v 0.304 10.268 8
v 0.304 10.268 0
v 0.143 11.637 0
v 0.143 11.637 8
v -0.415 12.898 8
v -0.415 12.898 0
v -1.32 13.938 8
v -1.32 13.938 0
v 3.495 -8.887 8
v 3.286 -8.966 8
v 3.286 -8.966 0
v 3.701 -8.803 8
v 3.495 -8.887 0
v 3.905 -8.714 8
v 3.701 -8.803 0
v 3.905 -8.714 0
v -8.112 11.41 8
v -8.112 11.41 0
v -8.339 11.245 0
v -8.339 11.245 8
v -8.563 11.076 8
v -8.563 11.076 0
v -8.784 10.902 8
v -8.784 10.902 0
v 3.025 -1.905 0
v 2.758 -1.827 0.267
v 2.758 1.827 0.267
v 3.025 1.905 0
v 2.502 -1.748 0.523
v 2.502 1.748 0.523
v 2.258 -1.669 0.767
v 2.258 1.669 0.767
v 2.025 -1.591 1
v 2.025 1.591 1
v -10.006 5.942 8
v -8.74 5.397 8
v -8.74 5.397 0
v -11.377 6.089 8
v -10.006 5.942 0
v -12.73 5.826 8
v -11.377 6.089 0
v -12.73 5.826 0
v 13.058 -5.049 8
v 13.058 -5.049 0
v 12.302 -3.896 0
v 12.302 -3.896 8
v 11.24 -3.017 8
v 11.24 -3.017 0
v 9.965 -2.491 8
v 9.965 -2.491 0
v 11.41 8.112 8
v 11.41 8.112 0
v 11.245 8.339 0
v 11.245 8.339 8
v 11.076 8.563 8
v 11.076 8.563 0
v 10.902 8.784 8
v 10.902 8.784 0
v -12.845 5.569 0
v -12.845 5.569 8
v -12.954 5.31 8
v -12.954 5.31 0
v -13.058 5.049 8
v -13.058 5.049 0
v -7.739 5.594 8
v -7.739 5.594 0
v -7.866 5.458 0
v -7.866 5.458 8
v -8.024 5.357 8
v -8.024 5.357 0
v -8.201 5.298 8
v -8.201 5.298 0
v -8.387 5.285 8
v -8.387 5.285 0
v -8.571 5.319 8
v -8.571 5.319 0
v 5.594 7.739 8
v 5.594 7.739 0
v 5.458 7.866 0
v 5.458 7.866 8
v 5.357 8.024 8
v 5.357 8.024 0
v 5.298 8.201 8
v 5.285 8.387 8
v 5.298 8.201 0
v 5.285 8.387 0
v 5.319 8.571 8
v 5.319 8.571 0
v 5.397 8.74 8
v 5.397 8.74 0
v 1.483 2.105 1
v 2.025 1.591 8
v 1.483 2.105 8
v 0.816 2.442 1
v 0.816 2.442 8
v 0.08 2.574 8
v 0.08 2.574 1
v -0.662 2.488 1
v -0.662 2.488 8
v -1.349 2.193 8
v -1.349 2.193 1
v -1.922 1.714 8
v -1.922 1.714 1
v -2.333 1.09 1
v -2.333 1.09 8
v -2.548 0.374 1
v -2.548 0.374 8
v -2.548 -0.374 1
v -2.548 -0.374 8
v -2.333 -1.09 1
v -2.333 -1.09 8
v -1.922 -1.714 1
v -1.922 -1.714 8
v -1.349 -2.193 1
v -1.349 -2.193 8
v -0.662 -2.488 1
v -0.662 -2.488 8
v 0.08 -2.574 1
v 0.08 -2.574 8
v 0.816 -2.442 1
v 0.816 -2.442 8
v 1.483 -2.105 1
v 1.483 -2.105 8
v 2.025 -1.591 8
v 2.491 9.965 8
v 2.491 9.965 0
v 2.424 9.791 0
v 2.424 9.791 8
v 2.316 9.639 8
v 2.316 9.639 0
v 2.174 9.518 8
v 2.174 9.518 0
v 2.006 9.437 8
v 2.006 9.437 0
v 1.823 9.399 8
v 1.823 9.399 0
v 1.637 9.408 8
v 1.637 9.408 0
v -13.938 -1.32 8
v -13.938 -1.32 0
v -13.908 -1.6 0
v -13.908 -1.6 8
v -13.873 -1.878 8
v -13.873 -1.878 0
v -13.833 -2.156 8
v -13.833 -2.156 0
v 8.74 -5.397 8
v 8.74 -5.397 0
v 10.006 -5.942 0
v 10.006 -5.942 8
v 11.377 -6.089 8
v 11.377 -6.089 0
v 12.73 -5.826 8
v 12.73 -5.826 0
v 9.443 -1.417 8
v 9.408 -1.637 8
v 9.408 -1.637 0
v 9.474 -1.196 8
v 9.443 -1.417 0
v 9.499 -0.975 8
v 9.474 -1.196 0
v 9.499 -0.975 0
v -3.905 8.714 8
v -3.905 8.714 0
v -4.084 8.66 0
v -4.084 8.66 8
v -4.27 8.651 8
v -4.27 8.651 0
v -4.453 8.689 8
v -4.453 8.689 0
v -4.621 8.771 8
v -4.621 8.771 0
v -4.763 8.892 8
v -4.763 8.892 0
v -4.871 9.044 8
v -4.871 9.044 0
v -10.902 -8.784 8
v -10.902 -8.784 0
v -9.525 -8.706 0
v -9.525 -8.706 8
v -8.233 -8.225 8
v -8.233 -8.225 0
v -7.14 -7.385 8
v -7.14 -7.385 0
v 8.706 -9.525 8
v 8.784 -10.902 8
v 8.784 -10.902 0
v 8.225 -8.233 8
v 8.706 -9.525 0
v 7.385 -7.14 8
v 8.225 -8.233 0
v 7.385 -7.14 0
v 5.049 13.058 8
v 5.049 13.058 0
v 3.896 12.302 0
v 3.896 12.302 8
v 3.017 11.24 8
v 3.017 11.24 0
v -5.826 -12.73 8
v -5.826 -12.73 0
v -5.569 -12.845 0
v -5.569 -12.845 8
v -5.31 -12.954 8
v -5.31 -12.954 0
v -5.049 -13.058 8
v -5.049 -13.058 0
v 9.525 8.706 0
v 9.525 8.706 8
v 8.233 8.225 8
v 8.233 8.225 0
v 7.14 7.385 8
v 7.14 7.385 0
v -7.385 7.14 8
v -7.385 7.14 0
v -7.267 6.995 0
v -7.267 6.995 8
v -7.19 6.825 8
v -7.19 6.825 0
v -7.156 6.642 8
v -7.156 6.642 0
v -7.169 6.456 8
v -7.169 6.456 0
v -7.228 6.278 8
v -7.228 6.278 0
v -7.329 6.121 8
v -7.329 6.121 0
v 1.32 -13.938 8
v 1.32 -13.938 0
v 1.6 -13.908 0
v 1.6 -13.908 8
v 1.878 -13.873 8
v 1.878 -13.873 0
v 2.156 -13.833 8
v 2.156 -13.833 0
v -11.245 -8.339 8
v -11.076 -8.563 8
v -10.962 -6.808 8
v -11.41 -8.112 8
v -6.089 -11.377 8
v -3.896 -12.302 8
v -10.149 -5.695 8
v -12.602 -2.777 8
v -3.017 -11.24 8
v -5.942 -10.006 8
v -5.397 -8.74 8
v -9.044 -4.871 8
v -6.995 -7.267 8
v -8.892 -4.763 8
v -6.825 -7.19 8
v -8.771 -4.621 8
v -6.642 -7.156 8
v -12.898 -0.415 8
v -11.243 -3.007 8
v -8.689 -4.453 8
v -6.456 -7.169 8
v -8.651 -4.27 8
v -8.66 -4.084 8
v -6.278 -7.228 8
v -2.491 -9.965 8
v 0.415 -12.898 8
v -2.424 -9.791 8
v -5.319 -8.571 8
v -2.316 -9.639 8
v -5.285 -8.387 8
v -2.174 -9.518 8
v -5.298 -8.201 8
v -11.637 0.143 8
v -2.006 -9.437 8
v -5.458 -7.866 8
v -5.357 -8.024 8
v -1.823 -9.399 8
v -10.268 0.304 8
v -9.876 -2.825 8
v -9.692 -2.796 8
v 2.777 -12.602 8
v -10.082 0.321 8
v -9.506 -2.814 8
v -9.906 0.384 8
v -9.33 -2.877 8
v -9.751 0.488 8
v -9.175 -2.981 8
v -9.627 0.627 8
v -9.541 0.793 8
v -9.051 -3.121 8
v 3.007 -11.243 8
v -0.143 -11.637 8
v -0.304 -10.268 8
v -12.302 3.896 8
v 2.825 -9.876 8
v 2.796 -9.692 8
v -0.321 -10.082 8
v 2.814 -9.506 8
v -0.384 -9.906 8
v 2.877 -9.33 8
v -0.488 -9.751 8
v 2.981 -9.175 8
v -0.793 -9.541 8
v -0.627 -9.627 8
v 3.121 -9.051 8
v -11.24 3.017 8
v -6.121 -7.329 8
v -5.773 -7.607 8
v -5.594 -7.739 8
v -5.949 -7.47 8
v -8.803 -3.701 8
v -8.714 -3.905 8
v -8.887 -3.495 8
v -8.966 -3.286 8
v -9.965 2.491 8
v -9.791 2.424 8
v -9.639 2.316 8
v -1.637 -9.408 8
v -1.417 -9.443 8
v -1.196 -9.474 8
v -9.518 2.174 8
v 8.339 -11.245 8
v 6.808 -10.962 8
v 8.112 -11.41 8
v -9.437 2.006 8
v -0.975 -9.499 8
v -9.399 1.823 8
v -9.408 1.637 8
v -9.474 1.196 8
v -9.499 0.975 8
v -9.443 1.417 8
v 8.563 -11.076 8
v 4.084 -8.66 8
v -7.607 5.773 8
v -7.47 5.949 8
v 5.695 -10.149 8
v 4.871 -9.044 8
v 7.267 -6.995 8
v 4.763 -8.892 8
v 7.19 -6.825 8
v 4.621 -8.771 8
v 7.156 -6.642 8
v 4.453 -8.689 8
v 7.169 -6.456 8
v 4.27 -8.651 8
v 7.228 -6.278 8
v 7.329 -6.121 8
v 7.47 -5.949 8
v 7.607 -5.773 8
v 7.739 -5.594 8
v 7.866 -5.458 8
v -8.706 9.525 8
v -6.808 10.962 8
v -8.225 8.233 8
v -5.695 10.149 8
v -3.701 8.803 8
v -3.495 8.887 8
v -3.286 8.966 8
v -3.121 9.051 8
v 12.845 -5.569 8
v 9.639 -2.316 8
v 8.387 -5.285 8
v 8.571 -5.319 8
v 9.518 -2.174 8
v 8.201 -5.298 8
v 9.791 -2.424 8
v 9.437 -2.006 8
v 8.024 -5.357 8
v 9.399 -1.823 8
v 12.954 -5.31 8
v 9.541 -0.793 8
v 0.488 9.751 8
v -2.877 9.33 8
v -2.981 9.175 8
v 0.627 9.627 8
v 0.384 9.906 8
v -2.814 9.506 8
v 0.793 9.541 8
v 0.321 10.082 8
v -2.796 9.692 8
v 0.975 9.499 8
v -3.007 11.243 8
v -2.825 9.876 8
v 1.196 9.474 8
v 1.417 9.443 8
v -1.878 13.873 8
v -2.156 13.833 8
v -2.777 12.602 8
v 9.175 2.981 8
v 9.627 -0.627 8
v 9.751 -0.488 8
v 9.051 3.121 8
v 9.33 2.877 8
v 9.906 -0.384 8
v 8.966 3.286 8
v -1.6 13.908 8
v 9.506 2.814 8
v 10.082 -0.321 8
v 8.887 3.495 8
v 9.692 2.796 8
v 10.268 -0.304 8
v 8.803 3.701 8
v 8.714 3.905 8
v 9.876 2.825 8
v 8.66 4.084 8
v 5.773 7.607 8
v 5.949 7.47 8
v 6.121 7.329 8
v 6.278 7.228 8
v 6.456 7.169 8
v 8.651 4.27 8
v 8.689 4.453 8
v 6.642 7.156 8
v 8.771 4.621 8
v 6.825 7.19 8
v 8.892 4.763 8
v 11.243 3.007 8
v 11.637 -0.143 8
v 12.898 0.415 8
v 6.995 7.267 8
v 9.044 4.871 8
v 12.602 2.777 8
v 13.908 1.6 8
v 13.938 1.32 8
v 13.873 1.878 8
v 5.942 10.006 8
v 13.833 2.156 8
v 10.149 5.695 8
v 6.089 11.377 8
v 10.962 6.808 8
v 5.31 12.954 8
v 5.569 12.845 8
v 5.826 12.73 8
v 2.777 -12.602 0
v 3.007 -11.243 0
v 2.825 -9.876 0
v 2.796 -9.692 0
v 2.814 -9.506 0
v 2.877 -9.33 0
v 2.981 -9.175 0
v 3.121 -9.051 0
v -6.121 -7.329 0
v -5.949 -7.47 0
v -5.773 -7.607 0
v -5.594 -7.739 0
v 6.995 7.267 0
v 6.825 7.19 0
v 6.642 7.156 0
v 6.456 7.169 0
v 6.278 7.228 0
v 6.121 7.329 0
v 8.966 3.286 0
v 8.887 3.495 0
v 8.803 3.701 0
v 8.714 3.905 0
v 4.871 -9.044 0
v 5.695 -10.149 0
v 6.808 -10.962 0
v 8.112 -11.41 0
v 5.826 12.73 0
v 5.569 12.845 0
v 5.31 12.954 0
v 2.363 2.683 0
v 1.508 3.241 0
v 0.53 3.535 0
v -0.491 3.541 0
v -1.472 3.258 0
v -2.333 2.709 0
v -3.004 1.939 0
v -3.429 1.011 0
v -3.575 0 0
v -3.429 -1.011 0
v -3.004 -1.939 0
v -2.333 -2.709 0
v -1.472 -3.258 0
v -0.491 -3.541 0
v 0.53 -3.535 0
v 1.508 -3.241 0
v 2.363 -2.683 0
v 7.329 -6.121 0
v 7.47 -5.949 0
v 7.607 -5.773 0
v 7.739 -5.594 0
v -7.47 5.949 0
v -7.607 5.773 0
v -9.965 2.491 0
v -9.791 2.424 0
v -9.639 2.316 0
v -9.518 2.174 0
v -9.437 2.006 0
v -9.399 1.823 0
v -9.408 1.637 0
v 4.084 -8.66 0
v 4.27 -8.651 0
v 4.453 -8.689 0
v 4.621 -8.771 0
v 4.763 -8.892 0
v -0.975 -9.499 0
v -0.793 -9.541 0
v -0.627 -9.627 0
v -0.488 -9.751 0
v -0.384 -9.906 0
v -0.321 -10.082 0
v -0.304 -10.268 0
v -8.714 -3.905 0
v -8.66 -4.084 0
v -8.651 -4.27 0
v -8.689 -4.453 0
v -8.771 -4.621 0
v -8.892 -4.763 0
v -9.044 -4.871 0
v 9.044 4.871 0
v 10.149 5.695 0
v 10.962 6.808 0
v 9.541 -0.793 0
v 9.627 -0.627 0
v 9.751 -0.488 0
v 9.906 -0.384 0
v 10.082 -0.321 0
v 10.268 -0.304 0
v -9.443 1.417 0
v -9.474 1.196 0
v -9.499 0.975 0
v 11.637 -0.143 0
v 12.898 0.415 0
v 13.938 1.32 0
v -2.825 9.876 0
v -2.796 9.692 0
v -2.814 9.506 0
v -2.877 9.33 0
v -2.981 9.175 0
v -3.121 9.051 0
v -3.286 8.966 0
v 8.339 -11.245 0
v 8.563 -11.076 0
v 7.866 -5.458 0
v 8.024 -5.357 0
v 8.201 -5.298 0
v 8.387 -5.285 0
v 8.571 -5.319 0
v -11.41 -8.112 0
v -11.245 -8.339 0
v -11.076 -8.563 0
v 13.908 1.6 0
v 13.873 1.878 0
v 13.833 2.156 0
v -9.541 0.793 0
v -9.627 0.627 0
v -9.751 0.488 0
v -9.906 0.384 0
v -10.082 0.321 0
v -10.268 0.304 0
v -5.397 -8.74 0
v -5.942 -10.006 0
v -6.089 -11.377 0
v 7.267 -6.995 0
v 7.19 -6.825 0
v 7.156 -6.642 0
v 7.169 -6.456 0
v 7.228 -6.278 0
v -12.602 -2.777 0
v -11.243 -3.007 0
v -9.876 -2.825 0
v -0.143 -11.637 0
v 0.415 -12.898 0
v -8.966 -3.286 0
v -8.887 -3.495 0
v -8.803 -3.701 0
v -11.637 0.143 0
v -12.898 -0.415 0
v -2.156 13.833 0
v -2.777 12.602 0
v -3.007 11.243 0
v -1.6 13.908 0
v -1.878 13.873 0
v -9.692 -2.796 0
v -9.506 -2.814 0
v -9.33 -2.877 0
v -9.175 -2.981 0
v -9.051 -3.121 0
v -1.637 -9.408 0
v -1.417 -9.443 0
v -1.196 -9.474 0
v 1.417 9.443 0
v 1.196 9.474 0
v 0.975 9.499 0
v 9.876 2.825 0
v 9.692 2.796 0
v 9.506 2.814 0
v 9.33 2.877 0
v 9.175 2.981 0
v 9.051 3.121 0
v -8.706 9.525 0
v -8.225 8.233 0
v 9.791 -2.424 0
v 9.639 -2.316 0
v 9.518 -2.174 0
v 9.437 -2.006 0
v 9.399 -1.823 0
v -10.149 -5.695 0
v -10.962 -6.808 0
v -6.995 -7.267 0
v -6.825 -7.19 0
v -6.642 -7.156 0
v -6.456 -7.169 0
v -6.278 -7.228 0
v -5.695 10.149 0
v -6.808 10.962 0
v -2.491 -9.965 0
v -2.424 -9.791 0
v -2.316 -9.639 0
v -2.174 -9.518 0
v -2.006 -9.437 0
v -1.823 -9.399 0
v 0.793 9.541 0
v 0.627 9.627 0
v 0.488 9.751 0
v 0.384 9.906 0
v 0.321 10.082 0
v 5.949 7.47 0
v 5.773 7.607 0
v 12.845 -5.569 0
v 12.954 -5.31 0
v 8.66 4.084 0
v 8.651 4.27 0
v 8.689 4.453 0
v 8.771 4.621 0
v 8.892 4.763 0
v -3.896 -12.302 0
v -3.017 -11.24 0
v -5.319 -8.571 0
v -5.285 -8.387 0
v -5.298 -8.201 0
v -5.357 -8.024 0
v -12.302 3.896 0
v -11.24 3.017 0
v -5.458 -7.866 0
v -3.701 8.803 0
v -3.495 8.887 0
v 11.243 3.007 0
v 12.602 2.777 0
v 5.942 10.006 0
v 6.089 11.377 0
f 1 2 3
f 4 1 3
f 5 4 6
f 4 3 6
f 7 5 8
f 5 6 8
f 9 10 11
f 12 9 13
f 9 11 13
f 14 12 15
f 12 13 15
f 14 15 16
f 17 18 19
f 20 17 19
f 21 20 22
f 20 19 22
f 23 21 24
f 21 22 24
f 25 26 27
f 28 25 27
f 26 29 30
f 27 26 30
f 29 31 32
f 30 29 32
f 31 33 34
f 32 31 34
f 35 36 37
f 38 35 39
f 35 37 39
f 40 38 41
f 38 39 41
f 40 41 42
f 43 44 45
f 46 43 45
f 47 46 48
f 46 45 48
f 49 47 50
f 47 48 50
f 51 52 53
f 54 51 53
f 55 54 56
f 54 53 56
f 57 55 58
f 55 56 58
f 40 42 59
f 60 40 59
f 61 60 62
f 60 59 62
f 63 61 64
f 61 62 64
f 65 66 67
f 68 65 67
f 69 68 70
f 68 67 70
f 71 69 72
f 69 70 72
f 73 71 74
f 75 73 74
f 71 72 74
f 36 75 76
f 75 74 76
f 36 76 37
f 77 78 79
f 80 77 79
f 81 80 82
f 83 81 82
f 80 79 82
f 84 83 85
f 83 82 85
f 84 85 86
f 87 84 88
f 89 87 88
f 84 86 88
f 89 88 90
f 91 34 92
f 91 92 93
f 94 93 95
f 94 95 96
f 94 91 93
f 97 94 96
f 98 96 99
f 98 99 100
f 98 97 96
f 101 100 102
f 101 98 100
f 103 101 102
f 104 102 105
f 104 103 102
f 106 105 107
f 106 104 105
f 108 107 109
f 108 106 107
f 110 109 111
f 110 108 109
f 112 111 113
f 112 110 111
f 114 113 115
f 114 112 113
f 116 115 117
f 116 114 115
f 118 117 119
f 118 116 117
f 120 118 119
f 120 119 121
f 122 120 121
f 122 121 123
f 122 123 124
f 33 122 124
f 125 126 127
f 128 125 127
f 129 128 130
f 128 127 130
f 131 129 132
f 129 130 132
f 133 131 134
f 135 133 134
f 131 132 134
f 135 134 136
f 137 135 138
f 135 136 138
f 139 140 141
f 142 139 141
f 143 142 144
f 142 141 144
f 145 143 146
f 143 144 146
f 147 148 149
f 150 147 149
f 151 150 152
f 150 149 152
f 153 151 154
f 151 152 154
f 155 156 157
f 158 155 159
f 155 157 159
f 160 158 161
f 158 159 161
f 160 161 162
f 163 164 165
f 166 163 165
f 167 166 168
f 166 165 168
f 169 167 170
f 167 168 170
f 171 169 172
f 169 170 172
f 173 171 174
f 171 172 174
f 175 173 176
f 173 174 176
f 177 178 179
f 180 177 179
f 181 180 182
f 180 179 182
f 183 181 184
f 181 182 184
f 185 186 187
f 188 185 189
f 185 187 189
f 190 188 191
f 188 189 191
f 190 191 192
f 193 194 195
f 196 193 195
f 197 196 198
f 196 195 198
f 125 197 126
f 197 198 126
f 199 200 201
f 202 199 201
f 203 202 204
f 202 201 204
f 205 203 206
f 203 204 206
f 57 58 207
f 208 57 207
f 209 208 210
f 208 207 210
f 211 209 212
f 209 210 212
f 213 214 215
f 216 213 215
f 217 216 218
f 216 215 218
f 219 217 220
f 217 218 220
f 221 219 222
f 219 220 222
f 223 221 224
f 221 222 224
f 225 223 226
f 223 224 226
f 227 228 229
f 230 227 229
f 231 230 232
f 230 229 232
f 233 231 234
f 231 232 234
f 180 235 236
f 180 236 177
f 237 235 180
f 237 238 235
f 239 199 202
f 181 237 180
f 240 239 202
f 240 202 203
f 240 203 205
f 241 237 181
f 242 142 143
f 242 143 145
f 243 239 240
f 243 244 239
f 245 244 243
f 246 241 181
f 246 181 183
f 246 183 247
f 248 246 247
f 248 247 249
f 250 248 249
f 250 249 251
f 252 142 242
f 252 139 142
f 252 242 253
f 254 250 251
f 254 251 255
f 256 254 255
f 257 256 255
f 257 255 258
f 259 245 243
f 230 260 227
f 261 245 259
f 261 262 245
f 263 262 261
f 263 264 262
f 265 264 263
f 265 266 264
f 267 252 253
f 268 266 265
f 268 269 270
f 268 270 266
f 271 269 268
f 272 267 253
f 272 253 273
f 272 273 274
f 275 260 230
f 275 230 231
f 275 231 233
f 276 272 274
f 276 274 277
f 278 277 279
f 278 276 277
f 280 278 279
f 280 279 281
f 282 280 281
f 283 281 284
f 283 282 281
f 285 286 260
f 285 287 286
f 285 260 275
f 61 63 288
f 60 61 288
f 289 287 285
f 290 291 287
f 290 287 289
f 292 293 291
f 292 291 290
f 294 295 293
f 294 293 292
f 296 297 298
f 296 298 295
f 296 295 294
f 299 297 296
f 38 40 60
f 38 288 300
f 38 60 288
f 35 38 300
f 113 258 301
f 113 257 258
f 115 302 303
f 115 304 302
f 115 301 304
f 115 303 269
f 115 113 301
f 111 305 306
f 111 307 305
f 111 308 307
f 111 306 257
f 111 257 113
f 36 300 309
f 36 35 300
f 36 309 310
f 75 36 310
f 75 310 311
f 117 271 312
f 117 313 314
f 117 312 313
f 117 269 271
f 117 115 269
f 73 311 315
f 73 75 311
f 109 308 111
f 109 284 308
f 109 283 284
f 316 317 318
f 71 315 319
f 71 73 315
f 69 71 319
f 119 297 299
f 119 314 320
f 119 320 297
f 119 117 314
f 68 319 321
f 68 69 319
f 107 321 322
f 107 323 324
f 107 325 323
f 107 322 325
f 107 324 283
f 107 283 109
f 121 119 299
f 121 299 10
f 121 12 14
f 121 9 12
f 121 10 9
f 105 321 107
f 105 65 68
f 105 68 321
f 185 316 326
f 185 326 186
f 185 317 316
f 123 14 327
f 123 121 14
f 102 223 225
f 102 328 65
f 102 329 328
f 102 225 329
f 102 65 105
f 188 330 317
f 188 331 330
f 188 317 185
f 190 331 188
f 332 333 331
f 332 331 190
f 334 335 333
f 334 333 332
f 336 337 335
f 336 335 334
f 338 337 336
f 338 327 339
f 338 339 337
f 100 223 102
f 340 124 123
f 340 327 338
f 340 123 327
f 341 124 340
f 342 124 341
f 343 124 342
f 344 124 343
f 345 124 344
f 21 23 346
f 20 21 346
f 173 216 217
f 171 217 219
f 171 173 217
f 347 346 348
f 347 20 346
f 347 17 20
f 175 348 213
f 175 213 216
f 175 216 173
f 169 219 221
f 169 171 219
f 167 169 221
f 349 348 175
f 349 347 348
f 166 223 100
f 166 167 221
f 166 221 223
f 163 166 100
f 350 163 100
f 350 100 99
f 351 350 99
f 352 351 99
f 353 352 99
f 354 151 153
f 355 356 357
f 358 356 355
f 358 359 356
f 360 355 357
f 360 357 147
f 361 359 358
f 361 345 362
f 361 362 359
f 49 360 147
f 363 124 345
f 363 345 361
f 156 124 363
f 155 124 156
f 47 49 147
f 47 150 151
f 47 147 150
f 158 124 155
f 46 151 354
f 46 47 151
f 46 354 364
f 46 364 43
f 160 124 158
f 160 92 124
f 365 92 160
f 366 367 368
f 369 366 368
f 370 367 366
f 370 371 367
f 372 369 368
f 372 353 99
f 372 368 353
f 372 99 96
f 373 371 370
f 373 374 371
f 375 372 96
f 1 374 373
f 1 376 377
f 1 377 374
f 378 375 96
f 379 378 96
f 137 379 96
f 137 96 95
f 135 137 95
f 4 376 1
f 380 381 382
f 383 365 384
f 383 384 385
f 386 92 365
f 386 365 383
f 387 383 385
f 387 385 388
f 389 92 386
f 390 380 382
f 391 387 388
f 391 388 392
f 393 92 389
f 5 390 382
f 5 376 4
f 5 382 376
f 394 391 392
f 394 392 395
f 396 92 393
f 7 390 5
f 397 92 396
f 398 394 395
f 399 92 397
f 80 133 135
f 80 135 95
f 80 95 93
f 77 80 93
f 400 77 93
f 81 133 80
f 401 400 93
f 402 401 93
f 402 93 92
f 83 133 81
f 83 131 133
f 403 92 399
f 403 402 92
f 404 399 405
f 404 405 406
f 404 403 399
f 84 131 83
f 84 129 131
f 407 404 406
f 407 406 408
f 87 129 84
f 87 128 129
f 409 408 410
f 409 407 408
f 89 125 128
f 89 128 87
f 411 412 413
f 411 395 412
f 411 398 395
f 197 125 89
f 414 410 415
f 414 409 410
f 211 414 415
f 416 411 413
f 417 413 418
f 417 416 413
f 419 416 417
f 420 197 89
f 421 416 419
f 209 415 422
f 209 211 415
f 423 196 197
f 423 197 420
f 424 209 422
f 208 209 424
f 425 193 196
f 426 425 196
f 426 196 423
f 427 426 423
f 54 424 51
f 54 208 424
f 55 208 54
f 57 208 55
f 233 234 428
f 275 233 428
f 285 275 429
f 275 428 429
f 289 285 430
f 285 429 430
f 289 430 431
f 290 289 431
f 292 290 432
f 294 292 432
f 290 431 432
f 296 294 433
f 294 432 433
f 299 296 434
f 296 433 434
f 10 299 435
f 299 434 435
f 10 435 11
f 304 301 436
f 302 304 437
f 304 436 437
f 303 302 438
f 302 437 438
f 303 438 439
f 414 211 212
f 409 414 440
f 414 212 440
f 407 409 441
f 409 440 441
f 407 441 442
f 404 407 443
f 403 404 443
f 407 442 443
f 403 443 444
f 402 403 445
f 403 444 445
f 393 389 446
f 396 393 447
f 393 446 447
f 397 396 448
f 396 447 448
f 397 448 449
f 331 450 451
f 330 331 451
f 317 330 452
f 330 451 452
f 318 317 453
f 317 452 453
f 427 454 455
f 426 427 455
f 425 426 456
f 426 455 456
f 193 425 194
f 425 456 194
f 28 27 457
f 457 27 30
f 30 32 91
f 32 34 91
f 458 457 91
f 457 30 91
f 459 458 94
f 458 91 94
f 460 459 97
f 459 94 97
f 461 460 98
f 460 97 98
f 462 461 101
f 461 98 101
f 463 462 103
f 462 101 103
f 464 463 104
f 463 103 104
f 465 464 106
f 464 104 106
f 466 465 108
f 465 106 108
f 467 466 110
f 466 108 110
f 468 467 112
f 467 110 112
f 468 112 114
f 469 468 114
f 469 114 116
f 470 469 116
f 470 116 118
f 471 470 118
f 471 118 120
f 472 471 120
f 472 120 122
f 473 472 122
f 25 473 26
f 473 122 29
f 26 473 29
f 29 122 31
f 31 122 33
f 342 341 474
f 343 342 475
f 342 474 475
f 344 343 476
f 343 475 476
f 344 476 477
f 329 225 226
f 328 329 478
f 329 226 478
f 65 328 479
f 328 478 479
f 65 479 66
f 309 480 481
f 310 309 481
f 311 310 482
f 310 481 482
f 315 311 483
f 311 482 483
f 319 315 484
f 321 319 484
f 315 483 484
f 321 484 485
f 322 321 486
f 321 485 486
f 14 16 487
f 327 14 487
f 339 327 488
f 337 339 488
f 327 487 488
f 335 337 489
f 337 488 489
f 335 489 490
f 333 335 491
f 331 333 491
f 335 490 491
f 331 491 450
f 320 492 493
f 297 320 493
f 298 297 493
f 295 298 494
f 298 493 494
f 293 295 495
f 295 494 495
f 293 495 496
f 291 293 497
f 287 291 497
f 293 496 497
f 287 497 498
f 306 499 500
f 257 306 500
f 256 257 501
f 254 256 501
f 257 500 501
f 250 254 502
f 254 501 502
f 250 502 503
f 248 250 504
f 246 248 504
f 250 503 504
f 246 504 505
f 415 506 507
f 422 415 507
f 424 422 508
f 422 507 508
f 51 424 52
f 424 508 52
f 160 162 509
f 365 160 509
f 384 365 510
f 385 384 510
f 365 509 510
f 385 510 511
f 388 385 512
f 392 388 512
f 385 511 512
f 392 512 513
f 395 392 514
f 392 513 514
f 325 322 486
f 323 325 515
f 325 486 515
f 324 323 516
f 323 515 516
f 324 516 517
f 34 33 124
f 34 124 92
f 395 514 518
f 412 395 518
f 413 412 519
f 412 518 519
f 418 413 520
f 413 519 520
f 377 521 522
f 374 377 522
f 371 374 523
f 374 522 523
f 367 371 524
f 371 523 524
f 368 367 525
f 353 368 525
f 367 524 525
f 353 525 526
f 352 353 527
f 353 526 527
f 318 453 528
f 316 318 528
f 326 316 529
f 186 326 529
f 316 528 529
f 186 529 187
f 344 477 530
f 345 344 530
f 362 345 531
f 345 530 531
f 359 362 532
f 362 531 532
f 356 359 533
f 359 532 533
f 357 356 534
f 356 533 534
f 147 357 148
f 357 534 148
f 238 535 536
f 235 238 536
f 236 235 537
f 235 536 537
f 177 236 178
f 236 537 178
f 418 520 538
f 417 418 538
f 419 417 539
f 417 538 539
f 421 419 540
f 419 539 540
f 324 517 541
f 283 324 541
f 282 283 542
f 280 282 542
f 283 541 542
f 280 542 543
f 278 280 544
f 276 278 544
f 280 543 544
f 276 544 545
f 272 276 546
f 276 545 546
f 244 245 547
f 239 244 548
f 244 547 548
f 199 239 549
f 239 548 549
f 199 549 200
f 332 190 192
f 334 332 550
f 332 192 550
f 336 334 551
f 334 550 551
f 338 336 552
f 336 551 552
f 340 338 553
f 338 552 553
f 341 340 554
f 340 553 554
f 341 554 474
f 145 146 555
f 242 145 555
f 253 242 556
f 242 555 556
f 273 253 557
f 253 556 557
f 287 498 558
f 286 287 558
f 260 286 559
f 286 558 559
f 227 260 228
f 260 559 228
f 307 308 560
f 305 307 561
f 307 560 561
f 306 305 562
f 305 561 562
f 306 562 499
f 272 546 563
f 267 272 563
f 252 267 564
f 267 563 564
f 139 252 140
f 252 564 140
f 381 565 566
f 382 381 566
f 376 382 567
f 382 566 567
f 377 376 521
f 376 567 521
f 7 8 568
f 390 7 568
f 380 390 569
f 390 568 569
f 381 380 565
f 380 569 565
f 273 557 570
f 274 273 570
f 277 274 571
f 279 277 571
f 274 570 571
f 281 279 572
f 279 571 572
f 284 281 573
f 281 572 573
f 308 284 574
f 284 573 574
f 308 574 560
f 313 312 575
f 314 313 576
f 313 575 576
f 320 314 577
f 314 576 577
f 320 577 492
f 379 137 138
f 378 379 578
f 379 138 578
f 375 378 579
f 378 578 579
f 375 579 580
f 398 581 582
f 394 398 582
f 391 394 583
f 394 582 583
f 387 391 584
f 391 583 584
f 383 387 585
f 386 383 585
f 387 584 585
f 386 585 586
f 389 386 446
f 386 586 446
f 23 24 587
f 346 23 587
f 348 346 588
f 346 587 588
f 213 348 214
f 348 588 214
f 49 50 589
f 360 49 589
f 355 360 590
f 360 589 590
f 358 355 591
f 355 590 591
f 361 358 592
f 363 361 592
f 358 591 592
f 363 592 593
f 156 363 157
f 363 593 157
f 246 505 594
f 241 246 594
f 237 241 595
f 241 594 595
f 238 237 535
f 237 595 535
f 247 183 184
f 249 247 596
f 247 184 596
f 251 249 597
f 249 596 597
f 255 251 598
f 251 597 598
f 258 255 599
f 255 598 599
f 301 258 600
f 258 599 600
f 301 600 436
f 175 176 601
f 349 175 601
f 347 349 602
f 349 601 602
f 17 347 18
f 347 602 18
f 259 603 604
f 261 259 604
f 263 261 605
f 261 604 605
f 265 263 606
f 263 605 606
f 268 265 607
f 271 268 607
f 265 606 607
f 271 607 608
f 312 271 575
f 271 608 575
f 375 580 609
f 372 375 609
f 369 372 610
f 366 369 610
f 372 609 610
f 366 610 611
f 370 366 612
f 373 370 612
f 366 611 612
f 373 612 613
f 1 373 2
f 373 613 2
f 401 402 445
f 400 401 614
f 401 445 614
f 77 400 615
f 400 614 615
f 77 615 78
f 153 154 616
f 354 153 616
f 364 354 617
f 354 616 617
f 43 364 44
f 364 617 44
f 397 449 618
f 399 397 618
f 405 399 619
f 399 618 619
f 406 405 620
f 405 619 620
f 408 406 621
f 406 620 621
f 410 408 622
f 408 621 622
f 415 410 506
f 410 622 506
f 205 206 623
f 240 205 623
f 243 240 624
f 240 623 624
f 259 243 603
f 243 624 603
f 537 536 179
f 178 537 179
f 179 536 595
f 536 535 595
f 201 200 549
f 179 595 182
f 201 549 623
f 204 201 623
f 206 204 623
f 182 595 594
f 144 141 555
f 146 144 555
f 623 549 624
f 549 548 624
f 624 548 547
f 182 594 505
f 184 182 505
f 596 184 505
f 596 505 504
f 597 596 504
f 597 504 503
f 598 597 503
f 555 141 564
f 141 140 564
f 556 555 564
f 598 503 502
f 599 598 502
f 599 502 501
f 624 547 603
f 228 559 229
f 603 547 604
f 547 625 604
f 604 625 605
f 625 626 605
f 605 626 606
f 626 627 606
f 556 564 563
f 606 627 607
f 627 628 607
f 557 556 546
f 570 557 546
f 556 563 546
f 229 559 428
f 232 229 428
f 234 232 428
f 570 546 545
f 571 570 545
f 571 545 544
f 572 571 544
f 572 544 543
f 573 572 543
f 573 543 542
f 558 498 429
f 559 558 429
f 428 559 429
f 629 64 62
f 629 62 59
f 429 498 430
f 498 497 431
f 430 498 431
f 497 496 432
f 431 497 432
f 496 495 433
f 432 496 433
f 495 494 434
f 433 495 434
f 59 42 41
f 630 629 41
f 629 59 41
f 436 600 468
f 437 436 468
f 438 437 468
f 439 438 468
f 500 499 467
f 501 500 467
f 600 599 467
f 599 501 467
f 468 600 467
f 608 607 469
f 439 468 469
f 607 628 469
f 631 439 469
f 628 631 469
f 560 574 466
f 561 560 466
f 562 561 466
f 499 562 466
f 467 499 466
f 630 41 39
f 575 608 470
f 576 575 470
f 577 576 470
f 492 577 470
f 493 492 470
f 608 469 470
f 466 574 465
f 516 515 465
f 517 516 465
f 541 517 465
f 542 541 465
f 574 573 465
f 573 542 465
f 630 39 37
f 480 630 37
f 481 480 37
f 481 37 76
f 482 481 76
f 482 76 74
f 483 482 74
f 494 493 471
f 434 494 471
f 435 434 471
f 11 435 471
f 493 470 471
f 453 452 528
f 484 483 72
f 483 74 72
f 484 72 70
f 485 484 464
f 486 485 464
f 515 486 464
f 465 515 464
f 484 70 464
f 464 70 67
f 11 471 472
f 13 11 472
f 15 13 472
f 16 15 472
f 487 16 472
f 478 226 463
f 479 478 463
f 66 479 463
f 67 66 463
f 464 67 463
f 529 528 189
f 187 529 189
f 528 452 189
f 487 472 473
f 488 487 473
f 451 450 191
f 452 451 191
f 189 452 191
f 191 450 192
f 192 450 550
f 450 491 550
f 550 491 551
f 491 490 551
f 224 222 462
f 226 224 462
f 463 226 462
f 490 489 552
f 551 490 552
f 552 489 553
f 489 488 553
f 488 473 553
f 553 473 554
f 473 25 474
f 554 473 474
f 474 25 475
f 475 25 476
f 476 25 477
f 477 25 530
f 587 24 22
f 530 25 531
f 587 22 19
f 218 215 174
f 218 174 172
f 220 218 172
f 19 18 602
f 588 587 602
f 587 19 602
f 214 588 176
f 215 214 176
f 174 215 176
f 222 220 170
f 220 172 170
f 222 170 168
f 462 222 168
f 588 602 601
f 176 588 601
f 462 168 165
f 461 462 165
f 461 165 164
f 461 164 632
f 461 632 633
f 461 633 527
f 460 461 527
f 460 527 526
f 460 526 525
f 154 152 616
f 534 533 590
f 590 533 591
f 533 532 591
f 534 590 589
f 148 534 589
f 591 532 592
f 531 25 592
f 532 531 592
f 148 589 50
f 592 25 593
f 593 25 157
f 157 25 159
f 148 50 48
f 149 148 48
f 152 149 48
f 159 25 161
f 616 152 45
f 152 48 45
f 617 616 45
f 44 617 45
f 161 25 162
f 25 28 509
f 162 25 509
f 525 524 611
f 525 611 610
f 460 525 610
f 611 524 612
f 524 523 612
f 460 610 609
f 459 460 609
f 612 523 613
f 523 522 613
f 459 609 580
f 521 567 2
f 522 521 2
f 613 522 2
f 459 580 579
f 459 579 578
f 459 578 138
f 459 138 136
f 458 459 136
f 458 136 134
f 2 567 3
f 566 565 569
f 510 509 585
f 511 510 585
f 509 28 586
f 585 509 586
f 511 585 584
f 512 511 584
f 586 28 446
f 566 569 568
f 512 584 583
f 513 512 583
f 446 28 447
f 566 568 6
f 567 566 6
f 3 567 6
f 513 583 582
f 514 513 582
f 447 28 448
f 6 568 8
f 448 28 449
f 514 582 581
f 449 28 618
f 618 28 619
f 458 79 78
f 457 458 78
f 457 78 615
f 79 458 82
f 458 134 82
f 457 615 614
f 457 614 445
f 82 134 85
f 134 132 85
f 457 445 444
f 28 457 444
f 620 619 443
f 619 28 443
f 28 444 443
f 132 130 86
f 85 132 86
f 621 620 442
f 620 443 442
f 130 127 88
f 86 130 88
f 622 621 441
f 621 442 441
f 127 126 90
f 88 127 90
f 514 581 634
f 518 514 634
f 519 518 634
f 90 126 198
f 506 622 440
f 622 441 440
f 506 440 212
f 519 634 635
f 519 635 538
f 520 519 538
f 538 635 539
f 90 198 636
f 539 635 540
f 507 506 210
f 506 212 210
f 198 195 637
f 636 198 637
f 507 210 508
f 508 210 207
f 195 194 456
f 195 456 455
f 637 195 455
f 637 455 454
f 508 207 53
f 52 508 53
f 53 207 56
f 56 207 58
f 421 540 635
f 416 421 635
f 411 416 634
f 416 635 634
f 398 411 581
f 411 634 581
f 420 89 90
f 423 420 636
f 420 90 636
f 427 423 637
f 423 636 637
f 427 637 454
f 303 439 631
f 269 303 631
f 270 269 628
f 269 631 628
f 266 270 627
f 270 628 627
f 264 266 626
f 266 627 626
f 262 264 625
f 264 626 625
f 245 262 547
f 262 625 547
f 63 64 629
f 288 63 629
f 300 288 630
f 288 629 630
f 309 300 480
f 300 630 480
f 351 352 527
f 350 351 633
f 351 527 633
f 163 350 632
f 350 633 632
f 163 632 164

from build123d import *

# Parameters (mm, degrees)
SKETCH3_R          = 14
GEARBODY_DEPTH     = 8
TOOTHCUT_DEPTH     = 22.354156504
CIRPATTERN1_COUNT  = 12
CUT_EXTRUDE1_DEPTH = 8
CHAMFER1_SIZE      = 1


with BuildPart() as part:
    # Sketch3 → gearBody (new body)
    with BuildSketch(Plane.XY):
        Circle(SKETCH3_R)
    extrude(amount=GEARBODY_DEPTH)

    # Sketch2 → toothCut (cut, through all)
    with BuildSketch(Plane.XY):
        with BuildLine():
            ThreePointArc((9.407882888, -1.636752947), (9.459378184, -1.306669437), (9.499295851, -0.974986654))
            ThreePointArc((9.499295851, -0.974986654), (9.751264317, -0.488083012), (10.267616219, -0.303844098))
            ThreePointArc((10.267616219, -0.303844098), (12.510323629, 0.19449452), (14.235972761, 1.711139825))
            ThreePointArc((14.235972761, 1.711139825), (14.203571583, -1.962007706), (13.238980983, -5.506387425))
            ThreePointArc((13.238980983, -5.506387425), (11.989111429, -3.578719403), (9.965486694, -2.491051791))
            ThreePointArc((9.965486694, -2.491051791), (9.51841766, -2.173730906), (9.407882888, -1.636752947))
        make_face()
    toothcut = extrude(amount=TOOTHCUT_DEPTH, mode=Mode.SUBTRACT)

    # CirPattern1: toothCut ×12 about axis
    cirpattern1_axis = Axis((0, 0, 0), (0, 0, 1))
    for i in range(1, CIRPATTERN1_COUNT):
        add(toothcut.rotate(cirpattern1_axis, i * 360 / CIRPATTERN1_COUNT), mode=Mode.SUBTRACT)

    # hub1Dia → Cut-Extrude1 (cut)
    with BuildSketch(Plane(origin=(0, 0, 0), x_dir=(-1, 0, 0), z_dir=(0, 0, -1))):
        with BuildLine():
            Line((-2.025, -1.590597372), (-2.025, 1.590597372))
            ThreePointArc((-2.025, 1.590597372), (2.575, 0), (-2.025, -1.590597372))
        make_face()
    extrude(amount=-CUT_EXTRUDE1_DEPTH, mode=Mode.SUBTRACT)

    # Chamfer1
    chamfer1_edges = [part.edges().sort_by_distance(p)[0] for p in [
        (-2.575, 0, 0),
        (2.025, 0, 0),
    ]]
    chamfer(chamfer1_edges, length=CHAMFER1_SIZE)


solid = part.part
